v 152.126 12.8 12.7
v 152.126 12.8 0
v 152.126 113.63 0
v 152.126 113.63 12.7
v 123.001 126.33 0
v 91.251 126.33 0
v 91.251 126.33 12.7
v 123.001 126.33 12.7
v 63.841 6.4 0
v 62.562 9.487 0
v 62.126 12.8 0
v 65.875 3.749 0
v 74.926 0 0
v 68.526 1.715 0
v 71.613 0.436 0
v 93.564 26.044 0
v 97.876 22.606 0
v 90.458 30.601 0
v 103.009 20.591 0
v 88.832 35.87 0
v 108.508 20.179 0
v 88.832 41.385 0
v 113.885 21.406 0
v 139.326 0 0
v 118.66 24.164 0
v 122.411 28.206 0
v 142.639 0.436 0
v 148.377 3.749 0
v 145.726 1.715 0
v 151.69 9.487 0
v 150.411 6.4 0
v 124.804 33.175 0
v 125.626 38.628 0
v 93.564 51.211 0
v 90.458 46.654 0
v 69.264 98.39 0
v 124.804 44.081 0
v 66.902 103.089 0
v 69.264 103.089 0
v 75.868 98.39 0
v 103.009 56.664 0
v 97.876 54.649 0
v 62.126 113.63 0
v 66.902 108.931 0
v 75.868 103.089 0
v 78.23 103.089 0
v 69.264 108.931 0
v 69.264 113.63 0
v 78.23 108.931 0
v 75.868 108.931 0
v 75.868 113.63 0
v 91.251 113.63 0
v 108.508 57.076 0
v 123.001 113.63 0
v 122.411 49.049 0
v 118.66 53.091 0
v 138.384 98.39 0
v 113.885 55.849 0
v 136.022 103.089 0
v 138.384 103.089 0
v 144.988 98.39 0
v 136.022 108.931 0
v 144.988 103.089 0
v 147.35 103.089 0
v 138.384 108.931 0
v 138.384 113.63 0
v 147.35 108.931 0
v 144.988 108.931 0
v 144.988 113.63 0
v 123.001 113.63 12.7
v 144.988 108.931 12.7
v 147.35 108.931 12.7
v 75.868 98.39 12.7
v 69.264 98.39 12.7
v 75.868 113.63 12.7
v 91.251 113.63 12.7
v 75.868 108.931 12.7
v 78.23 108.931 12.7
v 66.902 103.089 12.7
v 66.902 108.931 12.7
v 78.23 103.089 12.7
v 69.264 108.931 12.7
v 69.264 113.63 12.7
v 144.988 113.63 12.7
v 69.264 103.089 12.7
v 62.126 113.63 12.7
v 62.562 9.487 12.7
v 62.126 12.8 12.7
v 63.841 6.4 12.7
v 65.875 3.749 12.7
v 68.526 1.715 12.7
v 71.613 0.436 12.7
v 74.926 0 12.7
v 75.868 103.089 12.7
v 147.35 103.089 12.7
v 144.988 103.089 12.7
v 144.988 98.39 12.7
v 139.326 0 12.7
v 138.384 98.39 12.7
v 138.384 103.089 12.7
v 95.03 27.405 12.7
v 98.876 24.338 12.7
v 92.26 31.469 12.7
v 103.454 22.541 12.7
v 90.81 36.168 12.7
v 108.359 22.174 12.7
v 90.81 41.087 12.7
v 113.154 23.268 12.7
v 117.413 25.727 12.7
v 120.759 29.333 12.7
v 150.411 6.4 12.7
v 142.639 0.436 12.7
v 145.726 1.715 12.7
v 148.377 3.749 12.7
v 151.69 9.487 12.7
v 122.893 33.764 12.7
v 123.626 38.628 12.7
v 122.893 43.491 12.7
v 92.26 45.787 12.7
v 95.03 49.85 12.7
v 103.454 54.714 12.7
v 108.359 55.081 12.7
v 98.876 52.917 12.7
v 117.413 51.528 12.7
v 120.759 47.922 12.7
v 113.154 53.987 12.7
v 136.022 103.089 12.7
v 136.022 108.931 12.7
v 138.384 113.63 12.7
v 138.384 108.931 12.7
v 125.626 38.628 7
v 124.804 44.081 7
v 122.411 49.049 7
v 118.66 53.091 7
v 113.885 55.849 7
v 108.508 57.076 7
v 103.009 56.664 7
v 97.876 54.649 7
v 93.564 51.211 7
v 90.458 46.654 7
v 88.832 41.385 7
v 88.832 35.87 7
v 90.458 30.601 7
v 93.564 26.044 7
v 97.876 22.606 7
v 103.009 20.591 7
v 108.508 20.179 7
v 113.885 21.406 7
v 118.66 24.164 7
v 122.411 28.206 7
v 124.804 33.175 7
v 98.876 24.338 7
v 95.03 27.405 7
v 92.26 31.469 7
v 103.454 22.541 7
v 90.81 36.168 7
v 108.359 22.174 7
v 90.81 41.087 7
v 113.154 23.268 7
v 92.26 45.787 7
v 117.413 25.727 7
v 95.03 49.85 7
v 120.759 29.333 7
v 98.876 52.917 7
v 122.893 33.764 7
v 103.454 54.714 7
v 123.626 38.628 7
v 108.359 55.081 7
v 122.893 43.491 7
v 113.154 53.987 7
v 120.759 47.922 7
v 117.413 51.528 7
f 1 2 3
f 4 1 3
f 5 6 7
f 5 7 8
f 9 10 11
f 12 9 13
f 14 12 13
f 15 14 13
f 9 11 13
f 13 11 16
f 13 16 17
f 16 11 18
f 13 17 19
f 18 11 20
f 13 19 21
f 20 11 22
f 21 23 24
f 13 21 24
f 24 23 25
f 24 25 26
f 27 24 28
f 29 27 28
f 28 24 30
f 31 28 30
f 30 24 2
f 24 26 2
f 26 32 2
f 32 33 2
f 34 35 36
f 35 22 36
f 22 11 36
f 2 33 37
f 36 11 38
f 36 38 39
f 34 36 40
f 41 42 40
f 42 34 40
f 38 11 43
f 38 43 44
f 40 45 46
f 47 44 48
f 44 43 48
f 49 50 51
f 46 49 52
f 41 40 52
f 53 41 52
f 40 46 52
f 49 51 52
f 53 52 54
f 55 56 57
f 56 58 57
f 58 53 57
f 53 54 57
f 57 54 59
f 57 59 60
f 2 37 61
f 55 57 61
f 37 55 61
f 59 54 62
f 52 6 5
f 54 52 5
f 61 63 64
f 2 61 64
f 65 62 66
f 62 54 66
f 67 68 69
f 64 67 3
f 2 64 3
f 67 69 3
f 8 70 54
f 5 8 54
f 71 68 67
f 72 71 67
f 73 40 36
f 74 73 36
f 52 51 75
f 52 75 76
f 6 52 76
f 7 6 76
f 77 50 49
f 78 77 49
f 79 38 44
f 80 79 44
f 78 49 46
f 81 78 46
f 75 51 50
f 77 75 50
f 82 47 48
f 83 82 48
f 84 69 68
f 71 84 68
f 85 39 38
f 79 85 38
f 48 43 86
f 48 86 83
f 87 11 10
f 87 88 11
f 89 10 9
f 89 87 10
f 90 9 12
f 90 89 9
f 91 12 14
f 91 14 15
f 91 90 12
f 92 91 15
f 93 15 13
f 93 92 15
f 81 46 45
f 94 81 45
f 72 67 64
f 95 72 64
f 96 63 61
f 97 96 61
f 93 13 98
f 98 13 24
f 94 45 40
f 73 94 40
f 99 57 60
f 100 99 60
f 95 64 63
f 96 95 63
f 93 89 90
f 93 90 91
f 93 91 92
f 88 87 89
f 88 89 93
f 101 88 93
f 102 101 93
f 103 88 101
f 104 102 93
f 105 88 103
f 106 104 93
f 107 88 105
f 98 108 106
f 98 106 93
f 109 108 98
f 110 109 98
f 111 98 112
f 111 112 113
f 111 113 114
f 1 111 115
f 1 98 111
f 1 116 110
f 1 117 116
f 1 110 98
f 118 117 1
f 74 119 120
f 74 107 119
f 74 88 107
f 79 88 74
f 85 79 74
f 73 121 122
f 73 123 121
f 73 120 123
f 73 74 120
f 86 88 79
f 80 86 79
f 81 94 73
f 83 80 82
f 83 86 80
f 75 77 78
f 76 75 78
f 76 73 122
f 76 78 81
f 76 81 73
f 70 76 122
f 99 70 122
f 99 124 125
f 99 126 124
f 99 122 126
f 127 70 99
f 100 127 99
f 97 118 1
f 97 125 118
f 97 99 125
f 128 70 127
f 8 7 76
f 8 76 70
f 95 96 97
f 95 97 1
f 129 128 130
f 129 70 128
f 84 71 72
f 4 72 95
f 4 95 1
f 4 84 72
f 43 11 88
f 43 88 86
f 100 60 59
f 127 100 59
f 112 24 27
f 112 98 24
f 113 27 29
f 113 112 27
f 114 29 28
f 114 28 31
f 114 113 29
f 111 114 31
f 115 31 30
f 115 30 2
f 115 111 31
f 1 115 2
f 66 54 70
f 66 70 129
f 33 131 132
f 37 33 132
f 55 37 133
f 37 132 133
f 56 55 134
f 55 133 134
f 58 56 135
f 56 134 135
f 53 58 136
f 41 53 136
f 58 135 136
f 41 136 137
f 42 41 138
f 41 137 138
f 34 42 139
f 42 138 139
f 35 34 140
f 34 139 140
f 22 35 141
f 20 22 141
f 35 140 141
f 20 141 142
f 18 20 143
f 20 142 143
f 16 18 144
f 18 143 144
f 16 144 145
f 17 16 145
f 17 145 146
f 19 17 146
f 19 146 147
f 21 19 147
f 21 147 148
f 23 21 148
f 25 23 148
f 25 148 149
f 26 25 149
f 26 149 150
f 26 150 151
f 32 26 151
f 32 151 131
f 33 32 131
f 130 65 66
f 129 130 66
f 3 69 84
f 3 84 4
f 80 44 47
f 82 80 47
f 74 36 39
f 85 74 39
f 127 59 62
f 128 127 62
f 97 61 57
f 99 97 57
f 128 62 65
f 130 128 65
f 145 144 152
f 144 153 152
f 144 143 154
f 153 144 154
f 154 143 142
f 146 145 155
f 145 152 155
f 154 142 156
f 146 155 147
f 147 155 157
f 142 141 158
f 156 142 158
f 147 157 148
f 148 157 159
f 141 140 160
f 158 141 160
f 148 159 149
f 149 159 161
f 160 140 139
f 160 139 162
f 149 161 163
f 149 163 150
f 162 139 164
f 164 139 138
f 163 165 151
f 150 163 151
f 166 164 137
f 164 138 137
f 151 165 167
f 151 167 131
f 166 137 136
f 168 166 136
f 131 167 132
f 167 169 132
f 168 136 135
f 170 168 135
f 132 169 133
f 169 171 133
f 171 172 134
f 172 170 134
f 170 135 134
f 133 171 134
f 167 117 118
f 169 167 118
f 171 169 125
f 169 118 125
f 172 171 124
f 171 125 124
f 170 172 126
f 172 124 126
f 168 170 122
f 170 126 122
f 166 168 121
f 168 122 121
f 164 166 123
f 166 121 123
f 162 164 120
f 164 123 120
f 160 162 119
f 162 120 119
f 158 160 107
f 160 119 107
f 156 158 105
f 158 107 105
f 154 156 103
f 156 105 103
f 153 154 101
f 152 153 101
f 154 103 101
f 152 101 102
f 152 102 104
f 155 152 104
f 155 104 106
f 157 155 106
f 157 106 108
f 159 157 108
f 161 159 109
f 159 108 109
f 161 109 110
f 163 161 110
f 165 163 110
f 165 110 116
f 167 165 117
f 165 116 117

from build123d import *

# Parameters (mm, degrees)
SKETCH12_W           = 90
SKETCH12_H           = 113.63
BOSS_EXTRUDE10_DEPTH = 12.7
SKETCH25_R           = 18.5
CUT_EXTRUDE1_DEPTH   = 191.303286742
SKETCH26_R           = 18.5
SKETCH26_R_2         = 16.5
BOSS_EXTRUDE15_DEPTH = 5.7
FILLET1_R            = 12.8
CUT_EXTRUDE2_DEPTH   = 191.303286742
BOSS_EXTRUDE16_DEPTH = 12.7


with BuildPart() as part:
    # Sketch12 → Boss-Extrude10 (new body)
    with BuildSketch(Plane.XY):
        with Locations((107.125849364, 56.815)):
            Rectangle(SKETCH12_W, SKETCH12_H)
    extrude(amount=BOSS_EXTRUDE10_DEPTH)

    # Sketch25 → Cut-Extrude1 (cut, through all)
    with BuildSketch(Plane.XY.offset(12.7)):
        with Locations((107.125849364, 38.627603634)):
            Circle(SKETCH25_R)
    extrude(amount=-CUT_EXTRUDE1_DEPTH, mode=Mode.SUBTRACT)

    # Sketch26 → Boss-Extrude15 (add)
    with BuildSketch(Plane.XY.offset(12.7)):
        with Locations((107.125849364, 38.627603634)):
            Circle(SKETCH26_R)
        with Locations((107.125849364, 38.627603634)):
            Circle(SKETCH26_R_2, mode=Mode.SUBTRACT)
    extrude(amount=-BOSS_EXTRUDE15_DEPTH)

    # Fillet1
    fillet1_edges = [part.edges().sort_by_distance(p)[0] for p in [
        (62.125849364, 0, 6.35),
        (152.125849364, 0, 6.35),
    ]]
    fillet(fillet1_edges, radius=FILLET1_R)

    # Sketch27 → Cut-Extrude2 (cut, through all)
    with BuildSketch(Plane(origin=(0, 0, 0), x_dir=(-1, 0, 0), z_dir=(0, 0, -1))):
        Polygon((-69.263849364, 108.931), (-69.263849364, 113.63), (-75.867849364, 113.63), (-75.867849364, 108.931), (-78.229849364, 108.931), (-78.229849364, 103.089), (-75.867849364, 103.089), (-75.867849364, 98.39), (-69.263849364, 98.39), (-69.263849364, 103.089), (-66.901849364, 103.089), (-66.901849364, 108.931), align=None)
        Polygon((-138.383849364, 108.931), (-138.383849364, 113.63), (-144.987849364, 113.63), (-144.987849364, 108.931), (-147.349849364, 108.931), (-147.349849364, 103.089), (-144.987849364, 103.089), (-144.987849364, 98.39), (-138.383849364, 98.39), (-138.383849364, 103.089), (-136.021849364, 103.089), (-136.021849364, 108.931), align=None)
    extrude(amount=-CUT_EXTRUDE2_DEPTH, mode=Mode.SUBTRACT)

    # Sketch28 → Boss-Extrude16 (add)
    with BuildSketch(Plane(origin=(0, 113.63, 0), x_dir=(1, 0, 0), z_dir=(0, 1, 0))):
        Polygon((107.125849364, 0), (91.250849364, 0), (91.250849364, -12.7), (123.000849364, -12.7), (123.000849364, 0), align=None)
    extrude(amount=BOSS_EXTRUDE16_DEPTH)


solid = part.part
